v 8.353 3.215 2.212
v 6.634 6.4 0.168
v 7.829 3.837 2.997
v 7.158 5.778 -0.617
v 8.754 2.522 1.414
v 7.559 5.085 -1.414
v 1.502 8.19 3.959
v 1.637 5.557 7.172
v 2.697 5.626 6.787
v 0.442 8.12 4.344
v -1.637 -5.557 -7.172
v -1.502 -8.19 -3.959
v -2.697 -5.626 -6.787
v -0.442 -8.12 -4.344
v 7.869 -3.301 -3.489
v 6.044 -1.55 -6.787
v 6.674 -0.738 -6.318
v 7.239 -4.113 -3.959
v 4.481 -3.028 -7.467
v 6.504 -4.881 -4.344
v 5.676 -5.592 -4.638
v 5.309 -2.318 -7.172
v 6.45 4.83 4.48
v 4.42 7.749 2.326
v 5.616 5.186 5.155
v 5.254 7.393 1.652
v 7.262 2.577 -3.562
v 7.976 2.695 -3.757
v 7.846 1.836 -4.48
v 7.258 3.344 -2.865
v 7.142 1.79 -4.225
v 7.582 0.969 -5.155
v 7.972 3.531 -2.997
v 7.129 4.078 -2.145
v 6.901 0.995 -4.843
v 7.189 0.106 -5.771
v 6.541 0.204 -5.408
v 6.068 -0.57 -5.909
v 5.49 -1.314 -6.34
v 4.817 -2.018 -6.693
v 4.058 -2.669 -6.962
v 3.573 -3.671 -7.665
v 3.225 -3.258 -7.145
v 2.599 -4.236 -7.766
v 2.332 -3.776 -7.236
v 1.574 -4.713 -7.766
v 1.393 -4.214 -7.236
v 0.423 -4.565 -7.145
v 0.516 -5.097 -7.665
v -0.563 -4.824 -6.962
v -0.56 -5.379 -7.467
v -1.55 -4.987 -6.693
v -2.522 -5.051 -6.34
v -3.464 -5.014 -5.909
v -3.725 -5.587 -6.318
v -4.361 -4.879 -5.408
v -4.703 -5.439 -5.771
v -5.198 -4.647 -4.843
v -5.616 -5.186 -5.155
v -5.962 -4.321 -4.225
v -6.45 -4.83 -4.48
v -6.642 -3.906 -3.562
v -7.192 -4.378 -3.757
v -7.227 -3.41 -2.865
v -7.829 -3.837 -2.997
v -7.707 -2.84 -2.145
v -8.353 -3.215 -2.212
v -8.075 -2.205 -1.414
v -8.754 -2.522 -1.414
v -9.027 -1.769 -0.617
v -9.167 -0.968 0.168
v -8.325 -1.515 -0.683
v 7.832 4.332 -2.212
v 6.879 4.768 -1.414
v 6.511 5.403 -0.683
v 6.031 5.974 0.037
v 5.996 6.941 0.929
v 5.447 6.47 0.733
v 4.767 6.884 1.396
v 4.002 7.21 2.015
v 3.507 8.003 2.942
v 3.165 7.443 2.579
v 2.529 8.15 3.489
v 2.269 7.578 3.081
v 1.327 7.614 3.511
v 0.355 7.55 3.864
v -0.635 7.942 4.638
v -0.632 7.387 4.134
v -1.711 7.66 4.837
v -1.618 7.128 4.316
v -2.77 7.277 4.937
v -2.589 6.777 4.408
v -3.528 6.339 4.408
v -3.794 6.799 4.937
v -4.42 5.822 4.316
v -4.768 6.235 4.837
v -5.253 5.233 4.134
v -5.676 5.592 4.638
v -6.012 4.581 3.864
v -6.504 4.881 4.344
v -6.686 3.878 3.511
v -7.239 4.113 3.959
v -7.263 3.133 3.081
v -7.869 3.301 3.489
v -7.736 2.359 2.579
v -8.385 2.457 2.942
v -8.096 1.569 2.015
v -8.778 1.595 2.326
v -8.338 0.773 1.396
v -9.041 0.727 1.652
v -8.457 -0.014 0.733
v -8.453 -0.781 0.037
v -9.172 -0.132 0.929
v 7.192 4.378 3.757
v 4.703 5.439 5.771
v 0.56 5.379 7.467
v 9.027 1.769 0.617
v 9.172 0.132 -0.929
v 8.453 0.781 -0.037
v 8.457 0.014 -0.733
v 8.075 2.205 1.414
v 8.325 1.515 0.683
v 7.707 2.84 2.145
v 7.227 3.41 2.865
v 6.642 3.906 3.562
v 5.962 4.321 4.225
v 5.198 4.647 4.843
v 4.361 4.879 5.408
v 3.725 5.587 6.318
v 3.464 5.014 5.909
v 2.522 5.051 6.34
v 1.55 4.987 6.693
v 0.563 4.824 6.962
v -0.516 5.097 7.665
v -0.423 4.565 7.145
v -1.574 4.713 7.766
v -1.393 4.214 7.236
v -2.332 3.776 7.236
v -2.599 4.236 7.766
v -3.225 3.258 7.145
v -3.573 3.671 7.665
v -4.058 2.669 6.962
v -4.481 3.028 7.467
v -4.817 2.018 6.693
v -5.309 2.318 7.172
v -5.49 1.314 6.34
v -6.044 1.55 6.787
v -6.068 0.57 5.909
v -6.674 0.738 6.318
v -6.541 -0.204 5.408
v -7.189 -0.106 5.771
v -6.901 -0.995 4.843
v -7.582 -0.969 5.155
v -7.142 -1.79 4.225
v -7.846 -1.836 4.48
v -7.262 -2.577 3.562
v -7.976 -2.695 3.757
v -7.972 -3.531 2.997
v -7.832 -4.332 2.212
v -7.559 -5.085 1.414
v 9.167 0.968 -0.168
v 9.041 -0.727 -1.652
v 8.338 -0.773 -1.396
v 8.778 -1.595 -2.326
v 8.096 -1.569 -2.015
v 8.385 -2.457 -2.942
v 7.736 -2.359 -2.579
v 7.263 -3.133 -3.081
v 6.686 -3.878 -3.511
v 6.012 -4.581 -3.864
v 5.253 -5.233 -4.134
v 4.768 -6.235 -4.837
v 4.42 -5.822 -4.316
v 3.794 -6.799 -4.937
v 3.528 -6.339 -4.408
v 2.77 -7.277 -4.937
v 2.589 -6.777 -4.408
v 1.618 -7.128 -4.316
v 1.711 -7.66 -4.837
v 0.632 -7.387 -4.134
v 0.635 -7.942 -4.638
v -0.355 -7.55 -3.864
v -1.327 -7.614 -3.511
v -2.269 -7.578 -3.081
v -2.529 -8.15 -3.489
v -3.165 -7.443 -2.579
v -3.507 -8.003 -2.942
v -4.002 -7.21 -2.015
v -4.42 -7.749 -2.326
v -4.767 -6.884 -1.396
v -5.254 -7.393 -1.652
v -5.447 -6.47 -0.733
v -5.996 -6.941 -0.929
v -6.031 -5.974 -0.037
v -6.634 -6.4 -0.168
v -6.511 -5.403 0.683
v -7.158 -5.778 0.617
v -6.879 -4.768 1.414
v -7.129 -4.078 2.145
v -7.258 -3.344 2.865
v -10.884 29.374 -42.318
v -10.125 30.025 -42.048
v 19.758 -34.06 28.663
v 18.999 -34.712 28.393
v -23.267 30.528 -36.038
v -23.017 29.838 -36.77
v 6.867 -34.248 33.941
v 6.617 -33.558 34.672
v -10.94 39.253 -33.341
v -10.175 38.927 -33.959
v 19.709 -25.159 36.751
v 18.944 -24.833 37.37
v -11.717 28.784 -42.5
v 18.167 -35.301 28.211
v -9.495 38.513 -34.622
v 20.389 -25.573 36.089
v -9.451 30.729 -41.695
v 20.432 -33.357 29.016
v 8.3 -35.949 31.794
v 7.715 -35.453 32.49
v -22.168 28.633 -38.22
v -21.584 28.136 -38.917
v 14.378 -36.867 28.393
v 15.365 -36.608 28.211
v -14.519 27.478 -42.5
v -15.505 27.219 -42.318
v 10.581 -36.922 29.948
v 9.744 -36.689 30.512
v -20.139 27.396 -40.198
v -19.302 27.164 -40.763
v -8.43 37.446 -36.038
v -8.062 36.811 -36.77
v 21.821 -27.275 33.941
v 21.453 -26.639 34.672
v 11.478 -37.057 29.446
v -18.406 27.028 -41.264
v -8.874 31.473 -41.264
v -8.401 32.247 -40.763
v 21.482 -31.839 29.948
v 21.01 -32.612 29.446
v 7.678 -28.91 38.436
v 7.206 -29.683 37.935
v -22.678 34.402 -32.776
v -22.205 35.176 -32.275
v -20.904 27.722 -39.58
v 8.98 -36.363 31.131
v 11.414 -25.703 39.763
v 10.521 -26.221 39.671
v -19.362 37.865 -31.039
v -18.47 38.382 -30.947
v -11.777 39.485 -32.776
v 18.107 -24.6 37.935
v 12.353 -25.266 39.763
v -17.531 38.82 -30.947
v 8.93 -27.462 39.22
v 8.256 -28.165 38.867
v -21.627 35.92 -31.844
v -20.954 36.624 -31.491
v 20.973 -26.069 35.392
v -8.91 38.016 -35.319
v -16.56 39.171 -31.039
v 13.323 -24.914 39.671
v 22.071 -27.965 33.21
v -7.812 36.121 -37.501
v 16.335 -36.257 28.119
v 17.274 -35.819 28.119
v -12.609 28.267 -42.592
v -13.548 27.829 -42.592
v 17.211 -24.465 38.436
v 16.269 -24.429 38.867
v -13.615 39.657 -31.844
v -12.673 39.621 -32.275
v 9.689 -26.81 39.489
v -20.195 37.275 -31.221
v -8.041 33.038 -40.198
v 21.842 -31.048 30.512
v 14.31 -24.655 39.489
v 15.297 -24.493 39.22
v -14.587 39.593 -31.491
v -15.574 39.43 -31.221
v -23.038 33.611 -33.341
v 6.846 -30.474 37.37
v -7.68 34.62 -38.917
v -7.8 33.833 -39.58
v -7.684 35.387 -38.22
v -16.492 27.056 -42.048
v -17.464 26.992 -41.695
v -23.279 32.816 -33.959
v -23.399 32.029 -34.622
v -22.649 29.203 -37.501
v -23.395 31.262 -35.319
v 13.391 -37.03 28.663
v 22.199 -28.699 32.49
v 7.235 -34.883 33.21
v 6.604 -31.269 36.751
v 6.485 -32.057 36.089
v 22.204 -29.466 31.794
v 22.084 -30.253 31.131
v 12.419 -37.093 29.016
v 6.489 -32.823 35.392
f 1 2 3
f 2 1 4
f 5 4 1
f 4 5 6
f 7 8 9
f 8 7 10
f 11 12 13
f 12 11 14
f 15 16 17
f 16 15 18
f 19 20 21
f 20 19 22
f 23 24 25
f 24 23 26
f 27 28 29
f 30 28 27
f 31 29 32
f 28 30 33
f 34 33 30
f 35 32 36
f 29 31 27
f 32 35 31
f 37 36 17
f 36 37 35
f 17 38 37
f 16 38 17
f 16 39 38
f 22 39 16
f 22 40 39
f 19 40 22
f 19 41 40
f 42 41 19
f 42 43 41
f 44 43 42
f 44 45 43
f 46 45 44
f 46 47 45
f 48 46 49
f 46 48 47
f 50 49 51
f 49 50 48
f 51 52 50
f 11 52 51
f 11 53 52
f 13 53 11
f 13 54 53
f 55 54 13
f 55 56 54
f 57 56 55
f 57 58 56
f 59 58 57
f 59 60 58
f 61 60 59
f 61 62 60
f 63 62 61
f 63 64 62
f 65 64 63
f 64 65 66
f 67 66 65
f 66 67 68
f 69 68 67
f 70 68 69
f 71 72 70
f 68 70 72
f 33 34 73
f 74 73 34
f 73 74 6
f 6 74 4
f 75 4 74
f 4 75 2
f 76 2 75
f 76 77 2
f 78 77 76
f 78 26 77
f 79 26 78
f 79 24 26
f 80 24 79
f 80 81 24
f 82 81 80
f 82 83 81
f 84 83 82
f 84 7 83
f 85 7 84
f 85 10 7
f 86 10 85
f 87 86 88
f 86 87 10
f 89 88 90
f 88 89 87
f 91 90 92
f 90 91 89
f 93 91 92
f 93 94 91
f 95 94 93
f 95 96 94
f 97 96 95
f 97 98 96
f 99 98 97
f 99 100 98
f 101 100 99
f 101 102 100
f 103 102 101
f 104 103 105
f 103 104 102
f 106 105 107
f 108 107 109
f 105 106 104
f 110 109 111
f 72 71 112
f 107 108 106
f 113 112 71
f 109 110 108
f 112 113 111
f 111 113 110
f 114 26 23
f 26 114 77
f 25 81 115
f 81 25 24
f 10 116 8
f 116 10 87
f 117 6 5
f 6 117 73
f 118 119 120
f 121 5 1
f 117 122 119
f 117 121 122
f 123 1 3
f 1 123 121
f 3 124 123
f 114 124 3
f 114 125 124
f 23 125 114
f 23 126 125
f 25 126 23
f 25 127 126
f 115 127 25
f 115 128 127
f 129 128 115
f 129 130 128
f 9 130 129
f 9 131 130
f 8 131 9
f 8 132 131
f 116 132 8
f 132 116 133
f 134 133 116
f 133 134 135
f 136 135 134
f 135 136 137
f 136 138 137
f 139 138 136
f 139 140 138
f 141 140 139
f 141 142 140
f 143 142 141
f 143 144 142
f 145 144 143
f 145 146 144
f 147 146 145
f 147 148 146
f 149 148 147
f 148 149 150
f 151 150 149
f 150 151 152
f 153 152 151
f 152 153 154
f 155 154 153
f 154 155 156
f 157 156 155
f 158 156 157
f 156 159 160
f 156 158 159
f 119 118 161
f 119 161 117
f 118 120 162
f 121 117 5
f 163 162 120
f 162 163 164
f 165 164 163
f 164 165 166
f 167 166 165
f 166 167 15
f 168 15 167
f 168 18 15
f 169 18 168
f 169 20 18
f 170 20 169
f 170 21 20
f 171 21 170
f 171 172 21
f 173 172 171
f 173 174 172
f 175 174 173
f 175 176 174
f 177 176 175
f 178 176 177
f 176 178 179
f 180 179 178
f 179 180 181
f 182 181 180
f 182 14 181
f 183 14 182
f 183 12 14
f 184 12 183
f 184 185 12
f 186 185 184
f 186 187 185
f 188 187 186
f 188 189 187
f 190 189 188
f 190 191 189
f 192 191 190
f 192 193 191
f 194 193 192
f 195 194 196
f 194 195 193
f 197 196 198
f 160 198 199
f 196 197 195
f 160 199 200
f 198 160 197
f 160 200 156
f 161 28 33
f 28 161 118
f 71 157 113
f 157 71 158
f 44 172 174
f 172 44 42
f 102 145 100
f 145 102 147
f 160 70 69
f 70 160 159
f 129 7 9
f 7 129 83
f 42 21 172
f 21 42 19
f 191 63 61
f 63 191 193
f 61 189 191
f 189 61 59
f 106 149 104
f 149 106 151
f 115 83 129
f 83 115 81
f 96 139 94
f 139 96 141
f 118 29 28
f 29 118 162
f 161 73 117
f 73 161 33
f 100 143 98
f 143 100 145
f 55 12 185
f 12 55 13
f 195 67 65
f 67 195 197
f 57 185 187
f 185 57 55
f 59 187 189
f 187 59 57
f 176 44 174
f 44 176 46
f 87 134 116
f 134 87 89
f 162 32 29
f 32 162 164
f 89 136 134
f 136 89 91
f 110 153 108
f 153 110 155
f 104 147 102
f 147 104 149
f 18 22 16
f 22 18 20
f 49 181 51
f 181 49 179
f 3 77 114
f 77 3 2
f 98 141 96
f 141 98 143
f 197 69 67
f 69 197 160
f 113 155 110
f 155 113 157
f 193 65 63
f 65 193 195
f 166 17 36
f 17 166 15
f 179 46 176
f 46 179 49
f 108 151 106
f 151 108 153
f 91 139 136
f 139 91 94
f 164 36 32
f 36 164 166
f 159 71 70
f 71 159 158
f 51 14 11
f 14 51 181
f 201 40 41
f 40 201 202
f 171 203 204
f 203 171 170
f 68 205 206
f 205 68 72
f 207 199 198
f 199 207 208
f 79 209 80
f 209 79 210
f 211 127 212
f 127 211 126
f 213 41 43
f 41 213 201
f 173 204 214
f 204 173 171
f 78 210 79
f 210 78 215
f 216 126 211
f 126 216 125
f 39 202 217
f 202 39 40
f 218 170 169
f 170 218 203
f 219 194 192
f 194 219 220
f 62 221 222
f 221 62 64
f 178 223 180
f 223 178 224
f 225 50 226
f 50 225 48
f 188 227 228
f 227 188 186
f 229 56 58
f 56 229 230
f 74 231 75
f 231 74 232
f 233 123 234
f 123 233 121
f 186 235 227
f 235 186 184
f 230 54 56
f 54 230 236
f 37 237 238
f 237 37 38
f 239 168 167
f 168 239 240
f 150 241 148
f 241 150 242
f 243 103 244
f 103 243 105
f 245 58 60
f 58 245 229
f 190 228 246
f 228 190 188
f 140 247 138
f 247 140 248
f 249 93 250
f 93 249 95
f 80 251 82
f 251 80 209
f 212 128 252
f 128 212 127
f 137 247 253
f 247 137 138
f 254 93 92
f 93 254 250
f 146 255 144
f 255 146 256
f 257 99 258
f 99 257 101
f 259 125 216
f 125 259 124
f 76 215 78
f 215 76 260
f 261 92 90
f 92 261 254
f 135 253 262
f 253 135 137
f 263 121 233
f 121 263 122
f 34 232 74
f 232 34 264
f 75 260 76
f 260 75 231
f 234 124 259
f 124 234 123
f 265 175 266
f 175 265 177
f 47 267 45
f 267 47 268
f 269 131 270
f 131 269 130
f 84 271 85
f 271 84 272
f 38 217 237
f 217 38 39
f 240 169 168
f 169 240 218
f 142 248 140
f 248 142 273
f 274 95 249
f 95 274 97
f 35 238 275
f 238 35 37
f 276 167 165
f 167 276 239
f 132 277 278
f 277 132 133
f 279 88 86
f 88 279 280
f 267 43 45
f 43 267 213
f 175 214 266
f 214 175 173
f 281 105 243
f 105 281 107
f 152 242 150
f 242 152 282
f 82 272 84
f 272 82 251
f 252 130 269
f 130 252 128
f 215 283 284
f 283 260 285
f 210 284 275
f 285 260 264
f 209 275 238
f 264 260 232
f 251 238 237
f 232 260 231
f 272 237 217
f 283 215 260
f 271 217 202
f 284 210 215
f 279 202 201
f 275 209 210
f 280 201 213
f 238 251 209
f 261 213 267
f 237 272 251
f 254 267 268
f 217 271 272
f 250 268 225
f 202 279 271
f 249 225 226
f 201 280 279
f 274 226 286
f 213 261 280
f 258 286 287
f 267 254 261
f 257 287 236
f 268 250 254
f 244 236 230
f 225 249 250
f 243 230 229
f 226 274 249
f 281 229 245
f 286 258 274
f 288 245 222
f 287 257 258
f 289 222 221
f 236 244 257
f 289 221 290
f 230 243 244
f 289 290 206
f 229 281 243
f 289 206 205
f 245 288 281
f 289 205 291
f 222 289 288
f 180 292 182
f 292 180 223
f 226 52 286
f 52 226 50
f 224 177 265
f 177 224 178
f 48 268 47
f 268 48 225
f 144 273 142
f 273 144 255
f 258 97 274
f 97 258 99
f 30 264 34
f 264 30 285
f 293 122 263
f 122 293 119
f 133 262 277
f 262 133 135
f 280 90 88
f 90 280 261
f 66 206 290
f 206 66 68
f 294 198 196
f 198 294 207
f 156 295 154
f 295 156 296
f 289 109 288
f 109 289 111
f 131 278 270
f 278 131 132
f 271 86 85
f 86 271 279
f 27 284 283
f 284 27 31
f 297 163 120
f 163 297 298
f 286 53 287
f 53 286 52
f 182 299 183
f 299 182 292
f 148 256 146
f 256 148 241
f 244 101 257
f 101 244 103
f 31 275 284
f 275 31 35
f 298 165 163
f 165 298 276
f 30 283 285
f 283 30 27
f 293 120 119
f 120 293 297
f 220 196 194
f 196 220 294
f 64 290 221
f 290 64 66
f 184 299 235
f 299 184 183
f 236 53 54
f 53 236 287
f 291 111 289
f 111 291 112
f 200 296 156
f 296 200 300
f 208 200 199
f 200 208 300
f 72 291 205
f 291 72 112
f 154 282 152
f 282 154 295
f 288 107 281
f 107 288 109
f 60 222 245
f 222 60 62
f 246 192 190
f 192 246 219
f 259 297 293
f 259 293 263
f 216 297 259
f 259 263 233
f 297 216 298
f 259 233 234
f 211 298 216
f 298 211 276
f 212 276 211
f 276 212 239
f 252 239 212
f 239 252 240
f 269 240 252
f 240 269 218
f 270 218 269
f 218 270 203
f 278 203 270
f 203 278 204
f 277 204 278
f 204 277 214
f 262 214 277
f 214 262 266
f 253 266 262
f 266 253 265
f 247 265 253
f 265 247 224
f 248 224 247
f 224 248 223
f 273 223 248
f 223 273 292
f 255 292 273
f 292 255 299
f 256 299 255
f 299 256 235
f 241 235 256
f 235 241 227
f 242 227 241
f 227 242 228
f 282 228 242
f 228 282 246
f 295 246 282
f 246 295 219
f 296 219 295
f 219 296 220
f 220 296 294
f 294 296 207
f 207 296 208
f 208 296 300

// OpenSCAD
$fn = 50;

difference() {
	union() {
		translate(v = [0, 0, 0]) {
			rotate(a = [45, 0, 25]) {
				difference() {
					union() {
						translate(v = [0, 0, -2.0]) {
							union() {
								difference() {
									cylinder(h = 4.0, r = 9.0);
									cylinder(h = 4.0, r = 6.0);
								}
								difference() {
									translate(v = [0, 0, -50]) {
										cylinder(h = 100, r = 8.25);
									}
								}
							}
						}
					}
					union();
				}
			}
		}
	}
	union();
}
